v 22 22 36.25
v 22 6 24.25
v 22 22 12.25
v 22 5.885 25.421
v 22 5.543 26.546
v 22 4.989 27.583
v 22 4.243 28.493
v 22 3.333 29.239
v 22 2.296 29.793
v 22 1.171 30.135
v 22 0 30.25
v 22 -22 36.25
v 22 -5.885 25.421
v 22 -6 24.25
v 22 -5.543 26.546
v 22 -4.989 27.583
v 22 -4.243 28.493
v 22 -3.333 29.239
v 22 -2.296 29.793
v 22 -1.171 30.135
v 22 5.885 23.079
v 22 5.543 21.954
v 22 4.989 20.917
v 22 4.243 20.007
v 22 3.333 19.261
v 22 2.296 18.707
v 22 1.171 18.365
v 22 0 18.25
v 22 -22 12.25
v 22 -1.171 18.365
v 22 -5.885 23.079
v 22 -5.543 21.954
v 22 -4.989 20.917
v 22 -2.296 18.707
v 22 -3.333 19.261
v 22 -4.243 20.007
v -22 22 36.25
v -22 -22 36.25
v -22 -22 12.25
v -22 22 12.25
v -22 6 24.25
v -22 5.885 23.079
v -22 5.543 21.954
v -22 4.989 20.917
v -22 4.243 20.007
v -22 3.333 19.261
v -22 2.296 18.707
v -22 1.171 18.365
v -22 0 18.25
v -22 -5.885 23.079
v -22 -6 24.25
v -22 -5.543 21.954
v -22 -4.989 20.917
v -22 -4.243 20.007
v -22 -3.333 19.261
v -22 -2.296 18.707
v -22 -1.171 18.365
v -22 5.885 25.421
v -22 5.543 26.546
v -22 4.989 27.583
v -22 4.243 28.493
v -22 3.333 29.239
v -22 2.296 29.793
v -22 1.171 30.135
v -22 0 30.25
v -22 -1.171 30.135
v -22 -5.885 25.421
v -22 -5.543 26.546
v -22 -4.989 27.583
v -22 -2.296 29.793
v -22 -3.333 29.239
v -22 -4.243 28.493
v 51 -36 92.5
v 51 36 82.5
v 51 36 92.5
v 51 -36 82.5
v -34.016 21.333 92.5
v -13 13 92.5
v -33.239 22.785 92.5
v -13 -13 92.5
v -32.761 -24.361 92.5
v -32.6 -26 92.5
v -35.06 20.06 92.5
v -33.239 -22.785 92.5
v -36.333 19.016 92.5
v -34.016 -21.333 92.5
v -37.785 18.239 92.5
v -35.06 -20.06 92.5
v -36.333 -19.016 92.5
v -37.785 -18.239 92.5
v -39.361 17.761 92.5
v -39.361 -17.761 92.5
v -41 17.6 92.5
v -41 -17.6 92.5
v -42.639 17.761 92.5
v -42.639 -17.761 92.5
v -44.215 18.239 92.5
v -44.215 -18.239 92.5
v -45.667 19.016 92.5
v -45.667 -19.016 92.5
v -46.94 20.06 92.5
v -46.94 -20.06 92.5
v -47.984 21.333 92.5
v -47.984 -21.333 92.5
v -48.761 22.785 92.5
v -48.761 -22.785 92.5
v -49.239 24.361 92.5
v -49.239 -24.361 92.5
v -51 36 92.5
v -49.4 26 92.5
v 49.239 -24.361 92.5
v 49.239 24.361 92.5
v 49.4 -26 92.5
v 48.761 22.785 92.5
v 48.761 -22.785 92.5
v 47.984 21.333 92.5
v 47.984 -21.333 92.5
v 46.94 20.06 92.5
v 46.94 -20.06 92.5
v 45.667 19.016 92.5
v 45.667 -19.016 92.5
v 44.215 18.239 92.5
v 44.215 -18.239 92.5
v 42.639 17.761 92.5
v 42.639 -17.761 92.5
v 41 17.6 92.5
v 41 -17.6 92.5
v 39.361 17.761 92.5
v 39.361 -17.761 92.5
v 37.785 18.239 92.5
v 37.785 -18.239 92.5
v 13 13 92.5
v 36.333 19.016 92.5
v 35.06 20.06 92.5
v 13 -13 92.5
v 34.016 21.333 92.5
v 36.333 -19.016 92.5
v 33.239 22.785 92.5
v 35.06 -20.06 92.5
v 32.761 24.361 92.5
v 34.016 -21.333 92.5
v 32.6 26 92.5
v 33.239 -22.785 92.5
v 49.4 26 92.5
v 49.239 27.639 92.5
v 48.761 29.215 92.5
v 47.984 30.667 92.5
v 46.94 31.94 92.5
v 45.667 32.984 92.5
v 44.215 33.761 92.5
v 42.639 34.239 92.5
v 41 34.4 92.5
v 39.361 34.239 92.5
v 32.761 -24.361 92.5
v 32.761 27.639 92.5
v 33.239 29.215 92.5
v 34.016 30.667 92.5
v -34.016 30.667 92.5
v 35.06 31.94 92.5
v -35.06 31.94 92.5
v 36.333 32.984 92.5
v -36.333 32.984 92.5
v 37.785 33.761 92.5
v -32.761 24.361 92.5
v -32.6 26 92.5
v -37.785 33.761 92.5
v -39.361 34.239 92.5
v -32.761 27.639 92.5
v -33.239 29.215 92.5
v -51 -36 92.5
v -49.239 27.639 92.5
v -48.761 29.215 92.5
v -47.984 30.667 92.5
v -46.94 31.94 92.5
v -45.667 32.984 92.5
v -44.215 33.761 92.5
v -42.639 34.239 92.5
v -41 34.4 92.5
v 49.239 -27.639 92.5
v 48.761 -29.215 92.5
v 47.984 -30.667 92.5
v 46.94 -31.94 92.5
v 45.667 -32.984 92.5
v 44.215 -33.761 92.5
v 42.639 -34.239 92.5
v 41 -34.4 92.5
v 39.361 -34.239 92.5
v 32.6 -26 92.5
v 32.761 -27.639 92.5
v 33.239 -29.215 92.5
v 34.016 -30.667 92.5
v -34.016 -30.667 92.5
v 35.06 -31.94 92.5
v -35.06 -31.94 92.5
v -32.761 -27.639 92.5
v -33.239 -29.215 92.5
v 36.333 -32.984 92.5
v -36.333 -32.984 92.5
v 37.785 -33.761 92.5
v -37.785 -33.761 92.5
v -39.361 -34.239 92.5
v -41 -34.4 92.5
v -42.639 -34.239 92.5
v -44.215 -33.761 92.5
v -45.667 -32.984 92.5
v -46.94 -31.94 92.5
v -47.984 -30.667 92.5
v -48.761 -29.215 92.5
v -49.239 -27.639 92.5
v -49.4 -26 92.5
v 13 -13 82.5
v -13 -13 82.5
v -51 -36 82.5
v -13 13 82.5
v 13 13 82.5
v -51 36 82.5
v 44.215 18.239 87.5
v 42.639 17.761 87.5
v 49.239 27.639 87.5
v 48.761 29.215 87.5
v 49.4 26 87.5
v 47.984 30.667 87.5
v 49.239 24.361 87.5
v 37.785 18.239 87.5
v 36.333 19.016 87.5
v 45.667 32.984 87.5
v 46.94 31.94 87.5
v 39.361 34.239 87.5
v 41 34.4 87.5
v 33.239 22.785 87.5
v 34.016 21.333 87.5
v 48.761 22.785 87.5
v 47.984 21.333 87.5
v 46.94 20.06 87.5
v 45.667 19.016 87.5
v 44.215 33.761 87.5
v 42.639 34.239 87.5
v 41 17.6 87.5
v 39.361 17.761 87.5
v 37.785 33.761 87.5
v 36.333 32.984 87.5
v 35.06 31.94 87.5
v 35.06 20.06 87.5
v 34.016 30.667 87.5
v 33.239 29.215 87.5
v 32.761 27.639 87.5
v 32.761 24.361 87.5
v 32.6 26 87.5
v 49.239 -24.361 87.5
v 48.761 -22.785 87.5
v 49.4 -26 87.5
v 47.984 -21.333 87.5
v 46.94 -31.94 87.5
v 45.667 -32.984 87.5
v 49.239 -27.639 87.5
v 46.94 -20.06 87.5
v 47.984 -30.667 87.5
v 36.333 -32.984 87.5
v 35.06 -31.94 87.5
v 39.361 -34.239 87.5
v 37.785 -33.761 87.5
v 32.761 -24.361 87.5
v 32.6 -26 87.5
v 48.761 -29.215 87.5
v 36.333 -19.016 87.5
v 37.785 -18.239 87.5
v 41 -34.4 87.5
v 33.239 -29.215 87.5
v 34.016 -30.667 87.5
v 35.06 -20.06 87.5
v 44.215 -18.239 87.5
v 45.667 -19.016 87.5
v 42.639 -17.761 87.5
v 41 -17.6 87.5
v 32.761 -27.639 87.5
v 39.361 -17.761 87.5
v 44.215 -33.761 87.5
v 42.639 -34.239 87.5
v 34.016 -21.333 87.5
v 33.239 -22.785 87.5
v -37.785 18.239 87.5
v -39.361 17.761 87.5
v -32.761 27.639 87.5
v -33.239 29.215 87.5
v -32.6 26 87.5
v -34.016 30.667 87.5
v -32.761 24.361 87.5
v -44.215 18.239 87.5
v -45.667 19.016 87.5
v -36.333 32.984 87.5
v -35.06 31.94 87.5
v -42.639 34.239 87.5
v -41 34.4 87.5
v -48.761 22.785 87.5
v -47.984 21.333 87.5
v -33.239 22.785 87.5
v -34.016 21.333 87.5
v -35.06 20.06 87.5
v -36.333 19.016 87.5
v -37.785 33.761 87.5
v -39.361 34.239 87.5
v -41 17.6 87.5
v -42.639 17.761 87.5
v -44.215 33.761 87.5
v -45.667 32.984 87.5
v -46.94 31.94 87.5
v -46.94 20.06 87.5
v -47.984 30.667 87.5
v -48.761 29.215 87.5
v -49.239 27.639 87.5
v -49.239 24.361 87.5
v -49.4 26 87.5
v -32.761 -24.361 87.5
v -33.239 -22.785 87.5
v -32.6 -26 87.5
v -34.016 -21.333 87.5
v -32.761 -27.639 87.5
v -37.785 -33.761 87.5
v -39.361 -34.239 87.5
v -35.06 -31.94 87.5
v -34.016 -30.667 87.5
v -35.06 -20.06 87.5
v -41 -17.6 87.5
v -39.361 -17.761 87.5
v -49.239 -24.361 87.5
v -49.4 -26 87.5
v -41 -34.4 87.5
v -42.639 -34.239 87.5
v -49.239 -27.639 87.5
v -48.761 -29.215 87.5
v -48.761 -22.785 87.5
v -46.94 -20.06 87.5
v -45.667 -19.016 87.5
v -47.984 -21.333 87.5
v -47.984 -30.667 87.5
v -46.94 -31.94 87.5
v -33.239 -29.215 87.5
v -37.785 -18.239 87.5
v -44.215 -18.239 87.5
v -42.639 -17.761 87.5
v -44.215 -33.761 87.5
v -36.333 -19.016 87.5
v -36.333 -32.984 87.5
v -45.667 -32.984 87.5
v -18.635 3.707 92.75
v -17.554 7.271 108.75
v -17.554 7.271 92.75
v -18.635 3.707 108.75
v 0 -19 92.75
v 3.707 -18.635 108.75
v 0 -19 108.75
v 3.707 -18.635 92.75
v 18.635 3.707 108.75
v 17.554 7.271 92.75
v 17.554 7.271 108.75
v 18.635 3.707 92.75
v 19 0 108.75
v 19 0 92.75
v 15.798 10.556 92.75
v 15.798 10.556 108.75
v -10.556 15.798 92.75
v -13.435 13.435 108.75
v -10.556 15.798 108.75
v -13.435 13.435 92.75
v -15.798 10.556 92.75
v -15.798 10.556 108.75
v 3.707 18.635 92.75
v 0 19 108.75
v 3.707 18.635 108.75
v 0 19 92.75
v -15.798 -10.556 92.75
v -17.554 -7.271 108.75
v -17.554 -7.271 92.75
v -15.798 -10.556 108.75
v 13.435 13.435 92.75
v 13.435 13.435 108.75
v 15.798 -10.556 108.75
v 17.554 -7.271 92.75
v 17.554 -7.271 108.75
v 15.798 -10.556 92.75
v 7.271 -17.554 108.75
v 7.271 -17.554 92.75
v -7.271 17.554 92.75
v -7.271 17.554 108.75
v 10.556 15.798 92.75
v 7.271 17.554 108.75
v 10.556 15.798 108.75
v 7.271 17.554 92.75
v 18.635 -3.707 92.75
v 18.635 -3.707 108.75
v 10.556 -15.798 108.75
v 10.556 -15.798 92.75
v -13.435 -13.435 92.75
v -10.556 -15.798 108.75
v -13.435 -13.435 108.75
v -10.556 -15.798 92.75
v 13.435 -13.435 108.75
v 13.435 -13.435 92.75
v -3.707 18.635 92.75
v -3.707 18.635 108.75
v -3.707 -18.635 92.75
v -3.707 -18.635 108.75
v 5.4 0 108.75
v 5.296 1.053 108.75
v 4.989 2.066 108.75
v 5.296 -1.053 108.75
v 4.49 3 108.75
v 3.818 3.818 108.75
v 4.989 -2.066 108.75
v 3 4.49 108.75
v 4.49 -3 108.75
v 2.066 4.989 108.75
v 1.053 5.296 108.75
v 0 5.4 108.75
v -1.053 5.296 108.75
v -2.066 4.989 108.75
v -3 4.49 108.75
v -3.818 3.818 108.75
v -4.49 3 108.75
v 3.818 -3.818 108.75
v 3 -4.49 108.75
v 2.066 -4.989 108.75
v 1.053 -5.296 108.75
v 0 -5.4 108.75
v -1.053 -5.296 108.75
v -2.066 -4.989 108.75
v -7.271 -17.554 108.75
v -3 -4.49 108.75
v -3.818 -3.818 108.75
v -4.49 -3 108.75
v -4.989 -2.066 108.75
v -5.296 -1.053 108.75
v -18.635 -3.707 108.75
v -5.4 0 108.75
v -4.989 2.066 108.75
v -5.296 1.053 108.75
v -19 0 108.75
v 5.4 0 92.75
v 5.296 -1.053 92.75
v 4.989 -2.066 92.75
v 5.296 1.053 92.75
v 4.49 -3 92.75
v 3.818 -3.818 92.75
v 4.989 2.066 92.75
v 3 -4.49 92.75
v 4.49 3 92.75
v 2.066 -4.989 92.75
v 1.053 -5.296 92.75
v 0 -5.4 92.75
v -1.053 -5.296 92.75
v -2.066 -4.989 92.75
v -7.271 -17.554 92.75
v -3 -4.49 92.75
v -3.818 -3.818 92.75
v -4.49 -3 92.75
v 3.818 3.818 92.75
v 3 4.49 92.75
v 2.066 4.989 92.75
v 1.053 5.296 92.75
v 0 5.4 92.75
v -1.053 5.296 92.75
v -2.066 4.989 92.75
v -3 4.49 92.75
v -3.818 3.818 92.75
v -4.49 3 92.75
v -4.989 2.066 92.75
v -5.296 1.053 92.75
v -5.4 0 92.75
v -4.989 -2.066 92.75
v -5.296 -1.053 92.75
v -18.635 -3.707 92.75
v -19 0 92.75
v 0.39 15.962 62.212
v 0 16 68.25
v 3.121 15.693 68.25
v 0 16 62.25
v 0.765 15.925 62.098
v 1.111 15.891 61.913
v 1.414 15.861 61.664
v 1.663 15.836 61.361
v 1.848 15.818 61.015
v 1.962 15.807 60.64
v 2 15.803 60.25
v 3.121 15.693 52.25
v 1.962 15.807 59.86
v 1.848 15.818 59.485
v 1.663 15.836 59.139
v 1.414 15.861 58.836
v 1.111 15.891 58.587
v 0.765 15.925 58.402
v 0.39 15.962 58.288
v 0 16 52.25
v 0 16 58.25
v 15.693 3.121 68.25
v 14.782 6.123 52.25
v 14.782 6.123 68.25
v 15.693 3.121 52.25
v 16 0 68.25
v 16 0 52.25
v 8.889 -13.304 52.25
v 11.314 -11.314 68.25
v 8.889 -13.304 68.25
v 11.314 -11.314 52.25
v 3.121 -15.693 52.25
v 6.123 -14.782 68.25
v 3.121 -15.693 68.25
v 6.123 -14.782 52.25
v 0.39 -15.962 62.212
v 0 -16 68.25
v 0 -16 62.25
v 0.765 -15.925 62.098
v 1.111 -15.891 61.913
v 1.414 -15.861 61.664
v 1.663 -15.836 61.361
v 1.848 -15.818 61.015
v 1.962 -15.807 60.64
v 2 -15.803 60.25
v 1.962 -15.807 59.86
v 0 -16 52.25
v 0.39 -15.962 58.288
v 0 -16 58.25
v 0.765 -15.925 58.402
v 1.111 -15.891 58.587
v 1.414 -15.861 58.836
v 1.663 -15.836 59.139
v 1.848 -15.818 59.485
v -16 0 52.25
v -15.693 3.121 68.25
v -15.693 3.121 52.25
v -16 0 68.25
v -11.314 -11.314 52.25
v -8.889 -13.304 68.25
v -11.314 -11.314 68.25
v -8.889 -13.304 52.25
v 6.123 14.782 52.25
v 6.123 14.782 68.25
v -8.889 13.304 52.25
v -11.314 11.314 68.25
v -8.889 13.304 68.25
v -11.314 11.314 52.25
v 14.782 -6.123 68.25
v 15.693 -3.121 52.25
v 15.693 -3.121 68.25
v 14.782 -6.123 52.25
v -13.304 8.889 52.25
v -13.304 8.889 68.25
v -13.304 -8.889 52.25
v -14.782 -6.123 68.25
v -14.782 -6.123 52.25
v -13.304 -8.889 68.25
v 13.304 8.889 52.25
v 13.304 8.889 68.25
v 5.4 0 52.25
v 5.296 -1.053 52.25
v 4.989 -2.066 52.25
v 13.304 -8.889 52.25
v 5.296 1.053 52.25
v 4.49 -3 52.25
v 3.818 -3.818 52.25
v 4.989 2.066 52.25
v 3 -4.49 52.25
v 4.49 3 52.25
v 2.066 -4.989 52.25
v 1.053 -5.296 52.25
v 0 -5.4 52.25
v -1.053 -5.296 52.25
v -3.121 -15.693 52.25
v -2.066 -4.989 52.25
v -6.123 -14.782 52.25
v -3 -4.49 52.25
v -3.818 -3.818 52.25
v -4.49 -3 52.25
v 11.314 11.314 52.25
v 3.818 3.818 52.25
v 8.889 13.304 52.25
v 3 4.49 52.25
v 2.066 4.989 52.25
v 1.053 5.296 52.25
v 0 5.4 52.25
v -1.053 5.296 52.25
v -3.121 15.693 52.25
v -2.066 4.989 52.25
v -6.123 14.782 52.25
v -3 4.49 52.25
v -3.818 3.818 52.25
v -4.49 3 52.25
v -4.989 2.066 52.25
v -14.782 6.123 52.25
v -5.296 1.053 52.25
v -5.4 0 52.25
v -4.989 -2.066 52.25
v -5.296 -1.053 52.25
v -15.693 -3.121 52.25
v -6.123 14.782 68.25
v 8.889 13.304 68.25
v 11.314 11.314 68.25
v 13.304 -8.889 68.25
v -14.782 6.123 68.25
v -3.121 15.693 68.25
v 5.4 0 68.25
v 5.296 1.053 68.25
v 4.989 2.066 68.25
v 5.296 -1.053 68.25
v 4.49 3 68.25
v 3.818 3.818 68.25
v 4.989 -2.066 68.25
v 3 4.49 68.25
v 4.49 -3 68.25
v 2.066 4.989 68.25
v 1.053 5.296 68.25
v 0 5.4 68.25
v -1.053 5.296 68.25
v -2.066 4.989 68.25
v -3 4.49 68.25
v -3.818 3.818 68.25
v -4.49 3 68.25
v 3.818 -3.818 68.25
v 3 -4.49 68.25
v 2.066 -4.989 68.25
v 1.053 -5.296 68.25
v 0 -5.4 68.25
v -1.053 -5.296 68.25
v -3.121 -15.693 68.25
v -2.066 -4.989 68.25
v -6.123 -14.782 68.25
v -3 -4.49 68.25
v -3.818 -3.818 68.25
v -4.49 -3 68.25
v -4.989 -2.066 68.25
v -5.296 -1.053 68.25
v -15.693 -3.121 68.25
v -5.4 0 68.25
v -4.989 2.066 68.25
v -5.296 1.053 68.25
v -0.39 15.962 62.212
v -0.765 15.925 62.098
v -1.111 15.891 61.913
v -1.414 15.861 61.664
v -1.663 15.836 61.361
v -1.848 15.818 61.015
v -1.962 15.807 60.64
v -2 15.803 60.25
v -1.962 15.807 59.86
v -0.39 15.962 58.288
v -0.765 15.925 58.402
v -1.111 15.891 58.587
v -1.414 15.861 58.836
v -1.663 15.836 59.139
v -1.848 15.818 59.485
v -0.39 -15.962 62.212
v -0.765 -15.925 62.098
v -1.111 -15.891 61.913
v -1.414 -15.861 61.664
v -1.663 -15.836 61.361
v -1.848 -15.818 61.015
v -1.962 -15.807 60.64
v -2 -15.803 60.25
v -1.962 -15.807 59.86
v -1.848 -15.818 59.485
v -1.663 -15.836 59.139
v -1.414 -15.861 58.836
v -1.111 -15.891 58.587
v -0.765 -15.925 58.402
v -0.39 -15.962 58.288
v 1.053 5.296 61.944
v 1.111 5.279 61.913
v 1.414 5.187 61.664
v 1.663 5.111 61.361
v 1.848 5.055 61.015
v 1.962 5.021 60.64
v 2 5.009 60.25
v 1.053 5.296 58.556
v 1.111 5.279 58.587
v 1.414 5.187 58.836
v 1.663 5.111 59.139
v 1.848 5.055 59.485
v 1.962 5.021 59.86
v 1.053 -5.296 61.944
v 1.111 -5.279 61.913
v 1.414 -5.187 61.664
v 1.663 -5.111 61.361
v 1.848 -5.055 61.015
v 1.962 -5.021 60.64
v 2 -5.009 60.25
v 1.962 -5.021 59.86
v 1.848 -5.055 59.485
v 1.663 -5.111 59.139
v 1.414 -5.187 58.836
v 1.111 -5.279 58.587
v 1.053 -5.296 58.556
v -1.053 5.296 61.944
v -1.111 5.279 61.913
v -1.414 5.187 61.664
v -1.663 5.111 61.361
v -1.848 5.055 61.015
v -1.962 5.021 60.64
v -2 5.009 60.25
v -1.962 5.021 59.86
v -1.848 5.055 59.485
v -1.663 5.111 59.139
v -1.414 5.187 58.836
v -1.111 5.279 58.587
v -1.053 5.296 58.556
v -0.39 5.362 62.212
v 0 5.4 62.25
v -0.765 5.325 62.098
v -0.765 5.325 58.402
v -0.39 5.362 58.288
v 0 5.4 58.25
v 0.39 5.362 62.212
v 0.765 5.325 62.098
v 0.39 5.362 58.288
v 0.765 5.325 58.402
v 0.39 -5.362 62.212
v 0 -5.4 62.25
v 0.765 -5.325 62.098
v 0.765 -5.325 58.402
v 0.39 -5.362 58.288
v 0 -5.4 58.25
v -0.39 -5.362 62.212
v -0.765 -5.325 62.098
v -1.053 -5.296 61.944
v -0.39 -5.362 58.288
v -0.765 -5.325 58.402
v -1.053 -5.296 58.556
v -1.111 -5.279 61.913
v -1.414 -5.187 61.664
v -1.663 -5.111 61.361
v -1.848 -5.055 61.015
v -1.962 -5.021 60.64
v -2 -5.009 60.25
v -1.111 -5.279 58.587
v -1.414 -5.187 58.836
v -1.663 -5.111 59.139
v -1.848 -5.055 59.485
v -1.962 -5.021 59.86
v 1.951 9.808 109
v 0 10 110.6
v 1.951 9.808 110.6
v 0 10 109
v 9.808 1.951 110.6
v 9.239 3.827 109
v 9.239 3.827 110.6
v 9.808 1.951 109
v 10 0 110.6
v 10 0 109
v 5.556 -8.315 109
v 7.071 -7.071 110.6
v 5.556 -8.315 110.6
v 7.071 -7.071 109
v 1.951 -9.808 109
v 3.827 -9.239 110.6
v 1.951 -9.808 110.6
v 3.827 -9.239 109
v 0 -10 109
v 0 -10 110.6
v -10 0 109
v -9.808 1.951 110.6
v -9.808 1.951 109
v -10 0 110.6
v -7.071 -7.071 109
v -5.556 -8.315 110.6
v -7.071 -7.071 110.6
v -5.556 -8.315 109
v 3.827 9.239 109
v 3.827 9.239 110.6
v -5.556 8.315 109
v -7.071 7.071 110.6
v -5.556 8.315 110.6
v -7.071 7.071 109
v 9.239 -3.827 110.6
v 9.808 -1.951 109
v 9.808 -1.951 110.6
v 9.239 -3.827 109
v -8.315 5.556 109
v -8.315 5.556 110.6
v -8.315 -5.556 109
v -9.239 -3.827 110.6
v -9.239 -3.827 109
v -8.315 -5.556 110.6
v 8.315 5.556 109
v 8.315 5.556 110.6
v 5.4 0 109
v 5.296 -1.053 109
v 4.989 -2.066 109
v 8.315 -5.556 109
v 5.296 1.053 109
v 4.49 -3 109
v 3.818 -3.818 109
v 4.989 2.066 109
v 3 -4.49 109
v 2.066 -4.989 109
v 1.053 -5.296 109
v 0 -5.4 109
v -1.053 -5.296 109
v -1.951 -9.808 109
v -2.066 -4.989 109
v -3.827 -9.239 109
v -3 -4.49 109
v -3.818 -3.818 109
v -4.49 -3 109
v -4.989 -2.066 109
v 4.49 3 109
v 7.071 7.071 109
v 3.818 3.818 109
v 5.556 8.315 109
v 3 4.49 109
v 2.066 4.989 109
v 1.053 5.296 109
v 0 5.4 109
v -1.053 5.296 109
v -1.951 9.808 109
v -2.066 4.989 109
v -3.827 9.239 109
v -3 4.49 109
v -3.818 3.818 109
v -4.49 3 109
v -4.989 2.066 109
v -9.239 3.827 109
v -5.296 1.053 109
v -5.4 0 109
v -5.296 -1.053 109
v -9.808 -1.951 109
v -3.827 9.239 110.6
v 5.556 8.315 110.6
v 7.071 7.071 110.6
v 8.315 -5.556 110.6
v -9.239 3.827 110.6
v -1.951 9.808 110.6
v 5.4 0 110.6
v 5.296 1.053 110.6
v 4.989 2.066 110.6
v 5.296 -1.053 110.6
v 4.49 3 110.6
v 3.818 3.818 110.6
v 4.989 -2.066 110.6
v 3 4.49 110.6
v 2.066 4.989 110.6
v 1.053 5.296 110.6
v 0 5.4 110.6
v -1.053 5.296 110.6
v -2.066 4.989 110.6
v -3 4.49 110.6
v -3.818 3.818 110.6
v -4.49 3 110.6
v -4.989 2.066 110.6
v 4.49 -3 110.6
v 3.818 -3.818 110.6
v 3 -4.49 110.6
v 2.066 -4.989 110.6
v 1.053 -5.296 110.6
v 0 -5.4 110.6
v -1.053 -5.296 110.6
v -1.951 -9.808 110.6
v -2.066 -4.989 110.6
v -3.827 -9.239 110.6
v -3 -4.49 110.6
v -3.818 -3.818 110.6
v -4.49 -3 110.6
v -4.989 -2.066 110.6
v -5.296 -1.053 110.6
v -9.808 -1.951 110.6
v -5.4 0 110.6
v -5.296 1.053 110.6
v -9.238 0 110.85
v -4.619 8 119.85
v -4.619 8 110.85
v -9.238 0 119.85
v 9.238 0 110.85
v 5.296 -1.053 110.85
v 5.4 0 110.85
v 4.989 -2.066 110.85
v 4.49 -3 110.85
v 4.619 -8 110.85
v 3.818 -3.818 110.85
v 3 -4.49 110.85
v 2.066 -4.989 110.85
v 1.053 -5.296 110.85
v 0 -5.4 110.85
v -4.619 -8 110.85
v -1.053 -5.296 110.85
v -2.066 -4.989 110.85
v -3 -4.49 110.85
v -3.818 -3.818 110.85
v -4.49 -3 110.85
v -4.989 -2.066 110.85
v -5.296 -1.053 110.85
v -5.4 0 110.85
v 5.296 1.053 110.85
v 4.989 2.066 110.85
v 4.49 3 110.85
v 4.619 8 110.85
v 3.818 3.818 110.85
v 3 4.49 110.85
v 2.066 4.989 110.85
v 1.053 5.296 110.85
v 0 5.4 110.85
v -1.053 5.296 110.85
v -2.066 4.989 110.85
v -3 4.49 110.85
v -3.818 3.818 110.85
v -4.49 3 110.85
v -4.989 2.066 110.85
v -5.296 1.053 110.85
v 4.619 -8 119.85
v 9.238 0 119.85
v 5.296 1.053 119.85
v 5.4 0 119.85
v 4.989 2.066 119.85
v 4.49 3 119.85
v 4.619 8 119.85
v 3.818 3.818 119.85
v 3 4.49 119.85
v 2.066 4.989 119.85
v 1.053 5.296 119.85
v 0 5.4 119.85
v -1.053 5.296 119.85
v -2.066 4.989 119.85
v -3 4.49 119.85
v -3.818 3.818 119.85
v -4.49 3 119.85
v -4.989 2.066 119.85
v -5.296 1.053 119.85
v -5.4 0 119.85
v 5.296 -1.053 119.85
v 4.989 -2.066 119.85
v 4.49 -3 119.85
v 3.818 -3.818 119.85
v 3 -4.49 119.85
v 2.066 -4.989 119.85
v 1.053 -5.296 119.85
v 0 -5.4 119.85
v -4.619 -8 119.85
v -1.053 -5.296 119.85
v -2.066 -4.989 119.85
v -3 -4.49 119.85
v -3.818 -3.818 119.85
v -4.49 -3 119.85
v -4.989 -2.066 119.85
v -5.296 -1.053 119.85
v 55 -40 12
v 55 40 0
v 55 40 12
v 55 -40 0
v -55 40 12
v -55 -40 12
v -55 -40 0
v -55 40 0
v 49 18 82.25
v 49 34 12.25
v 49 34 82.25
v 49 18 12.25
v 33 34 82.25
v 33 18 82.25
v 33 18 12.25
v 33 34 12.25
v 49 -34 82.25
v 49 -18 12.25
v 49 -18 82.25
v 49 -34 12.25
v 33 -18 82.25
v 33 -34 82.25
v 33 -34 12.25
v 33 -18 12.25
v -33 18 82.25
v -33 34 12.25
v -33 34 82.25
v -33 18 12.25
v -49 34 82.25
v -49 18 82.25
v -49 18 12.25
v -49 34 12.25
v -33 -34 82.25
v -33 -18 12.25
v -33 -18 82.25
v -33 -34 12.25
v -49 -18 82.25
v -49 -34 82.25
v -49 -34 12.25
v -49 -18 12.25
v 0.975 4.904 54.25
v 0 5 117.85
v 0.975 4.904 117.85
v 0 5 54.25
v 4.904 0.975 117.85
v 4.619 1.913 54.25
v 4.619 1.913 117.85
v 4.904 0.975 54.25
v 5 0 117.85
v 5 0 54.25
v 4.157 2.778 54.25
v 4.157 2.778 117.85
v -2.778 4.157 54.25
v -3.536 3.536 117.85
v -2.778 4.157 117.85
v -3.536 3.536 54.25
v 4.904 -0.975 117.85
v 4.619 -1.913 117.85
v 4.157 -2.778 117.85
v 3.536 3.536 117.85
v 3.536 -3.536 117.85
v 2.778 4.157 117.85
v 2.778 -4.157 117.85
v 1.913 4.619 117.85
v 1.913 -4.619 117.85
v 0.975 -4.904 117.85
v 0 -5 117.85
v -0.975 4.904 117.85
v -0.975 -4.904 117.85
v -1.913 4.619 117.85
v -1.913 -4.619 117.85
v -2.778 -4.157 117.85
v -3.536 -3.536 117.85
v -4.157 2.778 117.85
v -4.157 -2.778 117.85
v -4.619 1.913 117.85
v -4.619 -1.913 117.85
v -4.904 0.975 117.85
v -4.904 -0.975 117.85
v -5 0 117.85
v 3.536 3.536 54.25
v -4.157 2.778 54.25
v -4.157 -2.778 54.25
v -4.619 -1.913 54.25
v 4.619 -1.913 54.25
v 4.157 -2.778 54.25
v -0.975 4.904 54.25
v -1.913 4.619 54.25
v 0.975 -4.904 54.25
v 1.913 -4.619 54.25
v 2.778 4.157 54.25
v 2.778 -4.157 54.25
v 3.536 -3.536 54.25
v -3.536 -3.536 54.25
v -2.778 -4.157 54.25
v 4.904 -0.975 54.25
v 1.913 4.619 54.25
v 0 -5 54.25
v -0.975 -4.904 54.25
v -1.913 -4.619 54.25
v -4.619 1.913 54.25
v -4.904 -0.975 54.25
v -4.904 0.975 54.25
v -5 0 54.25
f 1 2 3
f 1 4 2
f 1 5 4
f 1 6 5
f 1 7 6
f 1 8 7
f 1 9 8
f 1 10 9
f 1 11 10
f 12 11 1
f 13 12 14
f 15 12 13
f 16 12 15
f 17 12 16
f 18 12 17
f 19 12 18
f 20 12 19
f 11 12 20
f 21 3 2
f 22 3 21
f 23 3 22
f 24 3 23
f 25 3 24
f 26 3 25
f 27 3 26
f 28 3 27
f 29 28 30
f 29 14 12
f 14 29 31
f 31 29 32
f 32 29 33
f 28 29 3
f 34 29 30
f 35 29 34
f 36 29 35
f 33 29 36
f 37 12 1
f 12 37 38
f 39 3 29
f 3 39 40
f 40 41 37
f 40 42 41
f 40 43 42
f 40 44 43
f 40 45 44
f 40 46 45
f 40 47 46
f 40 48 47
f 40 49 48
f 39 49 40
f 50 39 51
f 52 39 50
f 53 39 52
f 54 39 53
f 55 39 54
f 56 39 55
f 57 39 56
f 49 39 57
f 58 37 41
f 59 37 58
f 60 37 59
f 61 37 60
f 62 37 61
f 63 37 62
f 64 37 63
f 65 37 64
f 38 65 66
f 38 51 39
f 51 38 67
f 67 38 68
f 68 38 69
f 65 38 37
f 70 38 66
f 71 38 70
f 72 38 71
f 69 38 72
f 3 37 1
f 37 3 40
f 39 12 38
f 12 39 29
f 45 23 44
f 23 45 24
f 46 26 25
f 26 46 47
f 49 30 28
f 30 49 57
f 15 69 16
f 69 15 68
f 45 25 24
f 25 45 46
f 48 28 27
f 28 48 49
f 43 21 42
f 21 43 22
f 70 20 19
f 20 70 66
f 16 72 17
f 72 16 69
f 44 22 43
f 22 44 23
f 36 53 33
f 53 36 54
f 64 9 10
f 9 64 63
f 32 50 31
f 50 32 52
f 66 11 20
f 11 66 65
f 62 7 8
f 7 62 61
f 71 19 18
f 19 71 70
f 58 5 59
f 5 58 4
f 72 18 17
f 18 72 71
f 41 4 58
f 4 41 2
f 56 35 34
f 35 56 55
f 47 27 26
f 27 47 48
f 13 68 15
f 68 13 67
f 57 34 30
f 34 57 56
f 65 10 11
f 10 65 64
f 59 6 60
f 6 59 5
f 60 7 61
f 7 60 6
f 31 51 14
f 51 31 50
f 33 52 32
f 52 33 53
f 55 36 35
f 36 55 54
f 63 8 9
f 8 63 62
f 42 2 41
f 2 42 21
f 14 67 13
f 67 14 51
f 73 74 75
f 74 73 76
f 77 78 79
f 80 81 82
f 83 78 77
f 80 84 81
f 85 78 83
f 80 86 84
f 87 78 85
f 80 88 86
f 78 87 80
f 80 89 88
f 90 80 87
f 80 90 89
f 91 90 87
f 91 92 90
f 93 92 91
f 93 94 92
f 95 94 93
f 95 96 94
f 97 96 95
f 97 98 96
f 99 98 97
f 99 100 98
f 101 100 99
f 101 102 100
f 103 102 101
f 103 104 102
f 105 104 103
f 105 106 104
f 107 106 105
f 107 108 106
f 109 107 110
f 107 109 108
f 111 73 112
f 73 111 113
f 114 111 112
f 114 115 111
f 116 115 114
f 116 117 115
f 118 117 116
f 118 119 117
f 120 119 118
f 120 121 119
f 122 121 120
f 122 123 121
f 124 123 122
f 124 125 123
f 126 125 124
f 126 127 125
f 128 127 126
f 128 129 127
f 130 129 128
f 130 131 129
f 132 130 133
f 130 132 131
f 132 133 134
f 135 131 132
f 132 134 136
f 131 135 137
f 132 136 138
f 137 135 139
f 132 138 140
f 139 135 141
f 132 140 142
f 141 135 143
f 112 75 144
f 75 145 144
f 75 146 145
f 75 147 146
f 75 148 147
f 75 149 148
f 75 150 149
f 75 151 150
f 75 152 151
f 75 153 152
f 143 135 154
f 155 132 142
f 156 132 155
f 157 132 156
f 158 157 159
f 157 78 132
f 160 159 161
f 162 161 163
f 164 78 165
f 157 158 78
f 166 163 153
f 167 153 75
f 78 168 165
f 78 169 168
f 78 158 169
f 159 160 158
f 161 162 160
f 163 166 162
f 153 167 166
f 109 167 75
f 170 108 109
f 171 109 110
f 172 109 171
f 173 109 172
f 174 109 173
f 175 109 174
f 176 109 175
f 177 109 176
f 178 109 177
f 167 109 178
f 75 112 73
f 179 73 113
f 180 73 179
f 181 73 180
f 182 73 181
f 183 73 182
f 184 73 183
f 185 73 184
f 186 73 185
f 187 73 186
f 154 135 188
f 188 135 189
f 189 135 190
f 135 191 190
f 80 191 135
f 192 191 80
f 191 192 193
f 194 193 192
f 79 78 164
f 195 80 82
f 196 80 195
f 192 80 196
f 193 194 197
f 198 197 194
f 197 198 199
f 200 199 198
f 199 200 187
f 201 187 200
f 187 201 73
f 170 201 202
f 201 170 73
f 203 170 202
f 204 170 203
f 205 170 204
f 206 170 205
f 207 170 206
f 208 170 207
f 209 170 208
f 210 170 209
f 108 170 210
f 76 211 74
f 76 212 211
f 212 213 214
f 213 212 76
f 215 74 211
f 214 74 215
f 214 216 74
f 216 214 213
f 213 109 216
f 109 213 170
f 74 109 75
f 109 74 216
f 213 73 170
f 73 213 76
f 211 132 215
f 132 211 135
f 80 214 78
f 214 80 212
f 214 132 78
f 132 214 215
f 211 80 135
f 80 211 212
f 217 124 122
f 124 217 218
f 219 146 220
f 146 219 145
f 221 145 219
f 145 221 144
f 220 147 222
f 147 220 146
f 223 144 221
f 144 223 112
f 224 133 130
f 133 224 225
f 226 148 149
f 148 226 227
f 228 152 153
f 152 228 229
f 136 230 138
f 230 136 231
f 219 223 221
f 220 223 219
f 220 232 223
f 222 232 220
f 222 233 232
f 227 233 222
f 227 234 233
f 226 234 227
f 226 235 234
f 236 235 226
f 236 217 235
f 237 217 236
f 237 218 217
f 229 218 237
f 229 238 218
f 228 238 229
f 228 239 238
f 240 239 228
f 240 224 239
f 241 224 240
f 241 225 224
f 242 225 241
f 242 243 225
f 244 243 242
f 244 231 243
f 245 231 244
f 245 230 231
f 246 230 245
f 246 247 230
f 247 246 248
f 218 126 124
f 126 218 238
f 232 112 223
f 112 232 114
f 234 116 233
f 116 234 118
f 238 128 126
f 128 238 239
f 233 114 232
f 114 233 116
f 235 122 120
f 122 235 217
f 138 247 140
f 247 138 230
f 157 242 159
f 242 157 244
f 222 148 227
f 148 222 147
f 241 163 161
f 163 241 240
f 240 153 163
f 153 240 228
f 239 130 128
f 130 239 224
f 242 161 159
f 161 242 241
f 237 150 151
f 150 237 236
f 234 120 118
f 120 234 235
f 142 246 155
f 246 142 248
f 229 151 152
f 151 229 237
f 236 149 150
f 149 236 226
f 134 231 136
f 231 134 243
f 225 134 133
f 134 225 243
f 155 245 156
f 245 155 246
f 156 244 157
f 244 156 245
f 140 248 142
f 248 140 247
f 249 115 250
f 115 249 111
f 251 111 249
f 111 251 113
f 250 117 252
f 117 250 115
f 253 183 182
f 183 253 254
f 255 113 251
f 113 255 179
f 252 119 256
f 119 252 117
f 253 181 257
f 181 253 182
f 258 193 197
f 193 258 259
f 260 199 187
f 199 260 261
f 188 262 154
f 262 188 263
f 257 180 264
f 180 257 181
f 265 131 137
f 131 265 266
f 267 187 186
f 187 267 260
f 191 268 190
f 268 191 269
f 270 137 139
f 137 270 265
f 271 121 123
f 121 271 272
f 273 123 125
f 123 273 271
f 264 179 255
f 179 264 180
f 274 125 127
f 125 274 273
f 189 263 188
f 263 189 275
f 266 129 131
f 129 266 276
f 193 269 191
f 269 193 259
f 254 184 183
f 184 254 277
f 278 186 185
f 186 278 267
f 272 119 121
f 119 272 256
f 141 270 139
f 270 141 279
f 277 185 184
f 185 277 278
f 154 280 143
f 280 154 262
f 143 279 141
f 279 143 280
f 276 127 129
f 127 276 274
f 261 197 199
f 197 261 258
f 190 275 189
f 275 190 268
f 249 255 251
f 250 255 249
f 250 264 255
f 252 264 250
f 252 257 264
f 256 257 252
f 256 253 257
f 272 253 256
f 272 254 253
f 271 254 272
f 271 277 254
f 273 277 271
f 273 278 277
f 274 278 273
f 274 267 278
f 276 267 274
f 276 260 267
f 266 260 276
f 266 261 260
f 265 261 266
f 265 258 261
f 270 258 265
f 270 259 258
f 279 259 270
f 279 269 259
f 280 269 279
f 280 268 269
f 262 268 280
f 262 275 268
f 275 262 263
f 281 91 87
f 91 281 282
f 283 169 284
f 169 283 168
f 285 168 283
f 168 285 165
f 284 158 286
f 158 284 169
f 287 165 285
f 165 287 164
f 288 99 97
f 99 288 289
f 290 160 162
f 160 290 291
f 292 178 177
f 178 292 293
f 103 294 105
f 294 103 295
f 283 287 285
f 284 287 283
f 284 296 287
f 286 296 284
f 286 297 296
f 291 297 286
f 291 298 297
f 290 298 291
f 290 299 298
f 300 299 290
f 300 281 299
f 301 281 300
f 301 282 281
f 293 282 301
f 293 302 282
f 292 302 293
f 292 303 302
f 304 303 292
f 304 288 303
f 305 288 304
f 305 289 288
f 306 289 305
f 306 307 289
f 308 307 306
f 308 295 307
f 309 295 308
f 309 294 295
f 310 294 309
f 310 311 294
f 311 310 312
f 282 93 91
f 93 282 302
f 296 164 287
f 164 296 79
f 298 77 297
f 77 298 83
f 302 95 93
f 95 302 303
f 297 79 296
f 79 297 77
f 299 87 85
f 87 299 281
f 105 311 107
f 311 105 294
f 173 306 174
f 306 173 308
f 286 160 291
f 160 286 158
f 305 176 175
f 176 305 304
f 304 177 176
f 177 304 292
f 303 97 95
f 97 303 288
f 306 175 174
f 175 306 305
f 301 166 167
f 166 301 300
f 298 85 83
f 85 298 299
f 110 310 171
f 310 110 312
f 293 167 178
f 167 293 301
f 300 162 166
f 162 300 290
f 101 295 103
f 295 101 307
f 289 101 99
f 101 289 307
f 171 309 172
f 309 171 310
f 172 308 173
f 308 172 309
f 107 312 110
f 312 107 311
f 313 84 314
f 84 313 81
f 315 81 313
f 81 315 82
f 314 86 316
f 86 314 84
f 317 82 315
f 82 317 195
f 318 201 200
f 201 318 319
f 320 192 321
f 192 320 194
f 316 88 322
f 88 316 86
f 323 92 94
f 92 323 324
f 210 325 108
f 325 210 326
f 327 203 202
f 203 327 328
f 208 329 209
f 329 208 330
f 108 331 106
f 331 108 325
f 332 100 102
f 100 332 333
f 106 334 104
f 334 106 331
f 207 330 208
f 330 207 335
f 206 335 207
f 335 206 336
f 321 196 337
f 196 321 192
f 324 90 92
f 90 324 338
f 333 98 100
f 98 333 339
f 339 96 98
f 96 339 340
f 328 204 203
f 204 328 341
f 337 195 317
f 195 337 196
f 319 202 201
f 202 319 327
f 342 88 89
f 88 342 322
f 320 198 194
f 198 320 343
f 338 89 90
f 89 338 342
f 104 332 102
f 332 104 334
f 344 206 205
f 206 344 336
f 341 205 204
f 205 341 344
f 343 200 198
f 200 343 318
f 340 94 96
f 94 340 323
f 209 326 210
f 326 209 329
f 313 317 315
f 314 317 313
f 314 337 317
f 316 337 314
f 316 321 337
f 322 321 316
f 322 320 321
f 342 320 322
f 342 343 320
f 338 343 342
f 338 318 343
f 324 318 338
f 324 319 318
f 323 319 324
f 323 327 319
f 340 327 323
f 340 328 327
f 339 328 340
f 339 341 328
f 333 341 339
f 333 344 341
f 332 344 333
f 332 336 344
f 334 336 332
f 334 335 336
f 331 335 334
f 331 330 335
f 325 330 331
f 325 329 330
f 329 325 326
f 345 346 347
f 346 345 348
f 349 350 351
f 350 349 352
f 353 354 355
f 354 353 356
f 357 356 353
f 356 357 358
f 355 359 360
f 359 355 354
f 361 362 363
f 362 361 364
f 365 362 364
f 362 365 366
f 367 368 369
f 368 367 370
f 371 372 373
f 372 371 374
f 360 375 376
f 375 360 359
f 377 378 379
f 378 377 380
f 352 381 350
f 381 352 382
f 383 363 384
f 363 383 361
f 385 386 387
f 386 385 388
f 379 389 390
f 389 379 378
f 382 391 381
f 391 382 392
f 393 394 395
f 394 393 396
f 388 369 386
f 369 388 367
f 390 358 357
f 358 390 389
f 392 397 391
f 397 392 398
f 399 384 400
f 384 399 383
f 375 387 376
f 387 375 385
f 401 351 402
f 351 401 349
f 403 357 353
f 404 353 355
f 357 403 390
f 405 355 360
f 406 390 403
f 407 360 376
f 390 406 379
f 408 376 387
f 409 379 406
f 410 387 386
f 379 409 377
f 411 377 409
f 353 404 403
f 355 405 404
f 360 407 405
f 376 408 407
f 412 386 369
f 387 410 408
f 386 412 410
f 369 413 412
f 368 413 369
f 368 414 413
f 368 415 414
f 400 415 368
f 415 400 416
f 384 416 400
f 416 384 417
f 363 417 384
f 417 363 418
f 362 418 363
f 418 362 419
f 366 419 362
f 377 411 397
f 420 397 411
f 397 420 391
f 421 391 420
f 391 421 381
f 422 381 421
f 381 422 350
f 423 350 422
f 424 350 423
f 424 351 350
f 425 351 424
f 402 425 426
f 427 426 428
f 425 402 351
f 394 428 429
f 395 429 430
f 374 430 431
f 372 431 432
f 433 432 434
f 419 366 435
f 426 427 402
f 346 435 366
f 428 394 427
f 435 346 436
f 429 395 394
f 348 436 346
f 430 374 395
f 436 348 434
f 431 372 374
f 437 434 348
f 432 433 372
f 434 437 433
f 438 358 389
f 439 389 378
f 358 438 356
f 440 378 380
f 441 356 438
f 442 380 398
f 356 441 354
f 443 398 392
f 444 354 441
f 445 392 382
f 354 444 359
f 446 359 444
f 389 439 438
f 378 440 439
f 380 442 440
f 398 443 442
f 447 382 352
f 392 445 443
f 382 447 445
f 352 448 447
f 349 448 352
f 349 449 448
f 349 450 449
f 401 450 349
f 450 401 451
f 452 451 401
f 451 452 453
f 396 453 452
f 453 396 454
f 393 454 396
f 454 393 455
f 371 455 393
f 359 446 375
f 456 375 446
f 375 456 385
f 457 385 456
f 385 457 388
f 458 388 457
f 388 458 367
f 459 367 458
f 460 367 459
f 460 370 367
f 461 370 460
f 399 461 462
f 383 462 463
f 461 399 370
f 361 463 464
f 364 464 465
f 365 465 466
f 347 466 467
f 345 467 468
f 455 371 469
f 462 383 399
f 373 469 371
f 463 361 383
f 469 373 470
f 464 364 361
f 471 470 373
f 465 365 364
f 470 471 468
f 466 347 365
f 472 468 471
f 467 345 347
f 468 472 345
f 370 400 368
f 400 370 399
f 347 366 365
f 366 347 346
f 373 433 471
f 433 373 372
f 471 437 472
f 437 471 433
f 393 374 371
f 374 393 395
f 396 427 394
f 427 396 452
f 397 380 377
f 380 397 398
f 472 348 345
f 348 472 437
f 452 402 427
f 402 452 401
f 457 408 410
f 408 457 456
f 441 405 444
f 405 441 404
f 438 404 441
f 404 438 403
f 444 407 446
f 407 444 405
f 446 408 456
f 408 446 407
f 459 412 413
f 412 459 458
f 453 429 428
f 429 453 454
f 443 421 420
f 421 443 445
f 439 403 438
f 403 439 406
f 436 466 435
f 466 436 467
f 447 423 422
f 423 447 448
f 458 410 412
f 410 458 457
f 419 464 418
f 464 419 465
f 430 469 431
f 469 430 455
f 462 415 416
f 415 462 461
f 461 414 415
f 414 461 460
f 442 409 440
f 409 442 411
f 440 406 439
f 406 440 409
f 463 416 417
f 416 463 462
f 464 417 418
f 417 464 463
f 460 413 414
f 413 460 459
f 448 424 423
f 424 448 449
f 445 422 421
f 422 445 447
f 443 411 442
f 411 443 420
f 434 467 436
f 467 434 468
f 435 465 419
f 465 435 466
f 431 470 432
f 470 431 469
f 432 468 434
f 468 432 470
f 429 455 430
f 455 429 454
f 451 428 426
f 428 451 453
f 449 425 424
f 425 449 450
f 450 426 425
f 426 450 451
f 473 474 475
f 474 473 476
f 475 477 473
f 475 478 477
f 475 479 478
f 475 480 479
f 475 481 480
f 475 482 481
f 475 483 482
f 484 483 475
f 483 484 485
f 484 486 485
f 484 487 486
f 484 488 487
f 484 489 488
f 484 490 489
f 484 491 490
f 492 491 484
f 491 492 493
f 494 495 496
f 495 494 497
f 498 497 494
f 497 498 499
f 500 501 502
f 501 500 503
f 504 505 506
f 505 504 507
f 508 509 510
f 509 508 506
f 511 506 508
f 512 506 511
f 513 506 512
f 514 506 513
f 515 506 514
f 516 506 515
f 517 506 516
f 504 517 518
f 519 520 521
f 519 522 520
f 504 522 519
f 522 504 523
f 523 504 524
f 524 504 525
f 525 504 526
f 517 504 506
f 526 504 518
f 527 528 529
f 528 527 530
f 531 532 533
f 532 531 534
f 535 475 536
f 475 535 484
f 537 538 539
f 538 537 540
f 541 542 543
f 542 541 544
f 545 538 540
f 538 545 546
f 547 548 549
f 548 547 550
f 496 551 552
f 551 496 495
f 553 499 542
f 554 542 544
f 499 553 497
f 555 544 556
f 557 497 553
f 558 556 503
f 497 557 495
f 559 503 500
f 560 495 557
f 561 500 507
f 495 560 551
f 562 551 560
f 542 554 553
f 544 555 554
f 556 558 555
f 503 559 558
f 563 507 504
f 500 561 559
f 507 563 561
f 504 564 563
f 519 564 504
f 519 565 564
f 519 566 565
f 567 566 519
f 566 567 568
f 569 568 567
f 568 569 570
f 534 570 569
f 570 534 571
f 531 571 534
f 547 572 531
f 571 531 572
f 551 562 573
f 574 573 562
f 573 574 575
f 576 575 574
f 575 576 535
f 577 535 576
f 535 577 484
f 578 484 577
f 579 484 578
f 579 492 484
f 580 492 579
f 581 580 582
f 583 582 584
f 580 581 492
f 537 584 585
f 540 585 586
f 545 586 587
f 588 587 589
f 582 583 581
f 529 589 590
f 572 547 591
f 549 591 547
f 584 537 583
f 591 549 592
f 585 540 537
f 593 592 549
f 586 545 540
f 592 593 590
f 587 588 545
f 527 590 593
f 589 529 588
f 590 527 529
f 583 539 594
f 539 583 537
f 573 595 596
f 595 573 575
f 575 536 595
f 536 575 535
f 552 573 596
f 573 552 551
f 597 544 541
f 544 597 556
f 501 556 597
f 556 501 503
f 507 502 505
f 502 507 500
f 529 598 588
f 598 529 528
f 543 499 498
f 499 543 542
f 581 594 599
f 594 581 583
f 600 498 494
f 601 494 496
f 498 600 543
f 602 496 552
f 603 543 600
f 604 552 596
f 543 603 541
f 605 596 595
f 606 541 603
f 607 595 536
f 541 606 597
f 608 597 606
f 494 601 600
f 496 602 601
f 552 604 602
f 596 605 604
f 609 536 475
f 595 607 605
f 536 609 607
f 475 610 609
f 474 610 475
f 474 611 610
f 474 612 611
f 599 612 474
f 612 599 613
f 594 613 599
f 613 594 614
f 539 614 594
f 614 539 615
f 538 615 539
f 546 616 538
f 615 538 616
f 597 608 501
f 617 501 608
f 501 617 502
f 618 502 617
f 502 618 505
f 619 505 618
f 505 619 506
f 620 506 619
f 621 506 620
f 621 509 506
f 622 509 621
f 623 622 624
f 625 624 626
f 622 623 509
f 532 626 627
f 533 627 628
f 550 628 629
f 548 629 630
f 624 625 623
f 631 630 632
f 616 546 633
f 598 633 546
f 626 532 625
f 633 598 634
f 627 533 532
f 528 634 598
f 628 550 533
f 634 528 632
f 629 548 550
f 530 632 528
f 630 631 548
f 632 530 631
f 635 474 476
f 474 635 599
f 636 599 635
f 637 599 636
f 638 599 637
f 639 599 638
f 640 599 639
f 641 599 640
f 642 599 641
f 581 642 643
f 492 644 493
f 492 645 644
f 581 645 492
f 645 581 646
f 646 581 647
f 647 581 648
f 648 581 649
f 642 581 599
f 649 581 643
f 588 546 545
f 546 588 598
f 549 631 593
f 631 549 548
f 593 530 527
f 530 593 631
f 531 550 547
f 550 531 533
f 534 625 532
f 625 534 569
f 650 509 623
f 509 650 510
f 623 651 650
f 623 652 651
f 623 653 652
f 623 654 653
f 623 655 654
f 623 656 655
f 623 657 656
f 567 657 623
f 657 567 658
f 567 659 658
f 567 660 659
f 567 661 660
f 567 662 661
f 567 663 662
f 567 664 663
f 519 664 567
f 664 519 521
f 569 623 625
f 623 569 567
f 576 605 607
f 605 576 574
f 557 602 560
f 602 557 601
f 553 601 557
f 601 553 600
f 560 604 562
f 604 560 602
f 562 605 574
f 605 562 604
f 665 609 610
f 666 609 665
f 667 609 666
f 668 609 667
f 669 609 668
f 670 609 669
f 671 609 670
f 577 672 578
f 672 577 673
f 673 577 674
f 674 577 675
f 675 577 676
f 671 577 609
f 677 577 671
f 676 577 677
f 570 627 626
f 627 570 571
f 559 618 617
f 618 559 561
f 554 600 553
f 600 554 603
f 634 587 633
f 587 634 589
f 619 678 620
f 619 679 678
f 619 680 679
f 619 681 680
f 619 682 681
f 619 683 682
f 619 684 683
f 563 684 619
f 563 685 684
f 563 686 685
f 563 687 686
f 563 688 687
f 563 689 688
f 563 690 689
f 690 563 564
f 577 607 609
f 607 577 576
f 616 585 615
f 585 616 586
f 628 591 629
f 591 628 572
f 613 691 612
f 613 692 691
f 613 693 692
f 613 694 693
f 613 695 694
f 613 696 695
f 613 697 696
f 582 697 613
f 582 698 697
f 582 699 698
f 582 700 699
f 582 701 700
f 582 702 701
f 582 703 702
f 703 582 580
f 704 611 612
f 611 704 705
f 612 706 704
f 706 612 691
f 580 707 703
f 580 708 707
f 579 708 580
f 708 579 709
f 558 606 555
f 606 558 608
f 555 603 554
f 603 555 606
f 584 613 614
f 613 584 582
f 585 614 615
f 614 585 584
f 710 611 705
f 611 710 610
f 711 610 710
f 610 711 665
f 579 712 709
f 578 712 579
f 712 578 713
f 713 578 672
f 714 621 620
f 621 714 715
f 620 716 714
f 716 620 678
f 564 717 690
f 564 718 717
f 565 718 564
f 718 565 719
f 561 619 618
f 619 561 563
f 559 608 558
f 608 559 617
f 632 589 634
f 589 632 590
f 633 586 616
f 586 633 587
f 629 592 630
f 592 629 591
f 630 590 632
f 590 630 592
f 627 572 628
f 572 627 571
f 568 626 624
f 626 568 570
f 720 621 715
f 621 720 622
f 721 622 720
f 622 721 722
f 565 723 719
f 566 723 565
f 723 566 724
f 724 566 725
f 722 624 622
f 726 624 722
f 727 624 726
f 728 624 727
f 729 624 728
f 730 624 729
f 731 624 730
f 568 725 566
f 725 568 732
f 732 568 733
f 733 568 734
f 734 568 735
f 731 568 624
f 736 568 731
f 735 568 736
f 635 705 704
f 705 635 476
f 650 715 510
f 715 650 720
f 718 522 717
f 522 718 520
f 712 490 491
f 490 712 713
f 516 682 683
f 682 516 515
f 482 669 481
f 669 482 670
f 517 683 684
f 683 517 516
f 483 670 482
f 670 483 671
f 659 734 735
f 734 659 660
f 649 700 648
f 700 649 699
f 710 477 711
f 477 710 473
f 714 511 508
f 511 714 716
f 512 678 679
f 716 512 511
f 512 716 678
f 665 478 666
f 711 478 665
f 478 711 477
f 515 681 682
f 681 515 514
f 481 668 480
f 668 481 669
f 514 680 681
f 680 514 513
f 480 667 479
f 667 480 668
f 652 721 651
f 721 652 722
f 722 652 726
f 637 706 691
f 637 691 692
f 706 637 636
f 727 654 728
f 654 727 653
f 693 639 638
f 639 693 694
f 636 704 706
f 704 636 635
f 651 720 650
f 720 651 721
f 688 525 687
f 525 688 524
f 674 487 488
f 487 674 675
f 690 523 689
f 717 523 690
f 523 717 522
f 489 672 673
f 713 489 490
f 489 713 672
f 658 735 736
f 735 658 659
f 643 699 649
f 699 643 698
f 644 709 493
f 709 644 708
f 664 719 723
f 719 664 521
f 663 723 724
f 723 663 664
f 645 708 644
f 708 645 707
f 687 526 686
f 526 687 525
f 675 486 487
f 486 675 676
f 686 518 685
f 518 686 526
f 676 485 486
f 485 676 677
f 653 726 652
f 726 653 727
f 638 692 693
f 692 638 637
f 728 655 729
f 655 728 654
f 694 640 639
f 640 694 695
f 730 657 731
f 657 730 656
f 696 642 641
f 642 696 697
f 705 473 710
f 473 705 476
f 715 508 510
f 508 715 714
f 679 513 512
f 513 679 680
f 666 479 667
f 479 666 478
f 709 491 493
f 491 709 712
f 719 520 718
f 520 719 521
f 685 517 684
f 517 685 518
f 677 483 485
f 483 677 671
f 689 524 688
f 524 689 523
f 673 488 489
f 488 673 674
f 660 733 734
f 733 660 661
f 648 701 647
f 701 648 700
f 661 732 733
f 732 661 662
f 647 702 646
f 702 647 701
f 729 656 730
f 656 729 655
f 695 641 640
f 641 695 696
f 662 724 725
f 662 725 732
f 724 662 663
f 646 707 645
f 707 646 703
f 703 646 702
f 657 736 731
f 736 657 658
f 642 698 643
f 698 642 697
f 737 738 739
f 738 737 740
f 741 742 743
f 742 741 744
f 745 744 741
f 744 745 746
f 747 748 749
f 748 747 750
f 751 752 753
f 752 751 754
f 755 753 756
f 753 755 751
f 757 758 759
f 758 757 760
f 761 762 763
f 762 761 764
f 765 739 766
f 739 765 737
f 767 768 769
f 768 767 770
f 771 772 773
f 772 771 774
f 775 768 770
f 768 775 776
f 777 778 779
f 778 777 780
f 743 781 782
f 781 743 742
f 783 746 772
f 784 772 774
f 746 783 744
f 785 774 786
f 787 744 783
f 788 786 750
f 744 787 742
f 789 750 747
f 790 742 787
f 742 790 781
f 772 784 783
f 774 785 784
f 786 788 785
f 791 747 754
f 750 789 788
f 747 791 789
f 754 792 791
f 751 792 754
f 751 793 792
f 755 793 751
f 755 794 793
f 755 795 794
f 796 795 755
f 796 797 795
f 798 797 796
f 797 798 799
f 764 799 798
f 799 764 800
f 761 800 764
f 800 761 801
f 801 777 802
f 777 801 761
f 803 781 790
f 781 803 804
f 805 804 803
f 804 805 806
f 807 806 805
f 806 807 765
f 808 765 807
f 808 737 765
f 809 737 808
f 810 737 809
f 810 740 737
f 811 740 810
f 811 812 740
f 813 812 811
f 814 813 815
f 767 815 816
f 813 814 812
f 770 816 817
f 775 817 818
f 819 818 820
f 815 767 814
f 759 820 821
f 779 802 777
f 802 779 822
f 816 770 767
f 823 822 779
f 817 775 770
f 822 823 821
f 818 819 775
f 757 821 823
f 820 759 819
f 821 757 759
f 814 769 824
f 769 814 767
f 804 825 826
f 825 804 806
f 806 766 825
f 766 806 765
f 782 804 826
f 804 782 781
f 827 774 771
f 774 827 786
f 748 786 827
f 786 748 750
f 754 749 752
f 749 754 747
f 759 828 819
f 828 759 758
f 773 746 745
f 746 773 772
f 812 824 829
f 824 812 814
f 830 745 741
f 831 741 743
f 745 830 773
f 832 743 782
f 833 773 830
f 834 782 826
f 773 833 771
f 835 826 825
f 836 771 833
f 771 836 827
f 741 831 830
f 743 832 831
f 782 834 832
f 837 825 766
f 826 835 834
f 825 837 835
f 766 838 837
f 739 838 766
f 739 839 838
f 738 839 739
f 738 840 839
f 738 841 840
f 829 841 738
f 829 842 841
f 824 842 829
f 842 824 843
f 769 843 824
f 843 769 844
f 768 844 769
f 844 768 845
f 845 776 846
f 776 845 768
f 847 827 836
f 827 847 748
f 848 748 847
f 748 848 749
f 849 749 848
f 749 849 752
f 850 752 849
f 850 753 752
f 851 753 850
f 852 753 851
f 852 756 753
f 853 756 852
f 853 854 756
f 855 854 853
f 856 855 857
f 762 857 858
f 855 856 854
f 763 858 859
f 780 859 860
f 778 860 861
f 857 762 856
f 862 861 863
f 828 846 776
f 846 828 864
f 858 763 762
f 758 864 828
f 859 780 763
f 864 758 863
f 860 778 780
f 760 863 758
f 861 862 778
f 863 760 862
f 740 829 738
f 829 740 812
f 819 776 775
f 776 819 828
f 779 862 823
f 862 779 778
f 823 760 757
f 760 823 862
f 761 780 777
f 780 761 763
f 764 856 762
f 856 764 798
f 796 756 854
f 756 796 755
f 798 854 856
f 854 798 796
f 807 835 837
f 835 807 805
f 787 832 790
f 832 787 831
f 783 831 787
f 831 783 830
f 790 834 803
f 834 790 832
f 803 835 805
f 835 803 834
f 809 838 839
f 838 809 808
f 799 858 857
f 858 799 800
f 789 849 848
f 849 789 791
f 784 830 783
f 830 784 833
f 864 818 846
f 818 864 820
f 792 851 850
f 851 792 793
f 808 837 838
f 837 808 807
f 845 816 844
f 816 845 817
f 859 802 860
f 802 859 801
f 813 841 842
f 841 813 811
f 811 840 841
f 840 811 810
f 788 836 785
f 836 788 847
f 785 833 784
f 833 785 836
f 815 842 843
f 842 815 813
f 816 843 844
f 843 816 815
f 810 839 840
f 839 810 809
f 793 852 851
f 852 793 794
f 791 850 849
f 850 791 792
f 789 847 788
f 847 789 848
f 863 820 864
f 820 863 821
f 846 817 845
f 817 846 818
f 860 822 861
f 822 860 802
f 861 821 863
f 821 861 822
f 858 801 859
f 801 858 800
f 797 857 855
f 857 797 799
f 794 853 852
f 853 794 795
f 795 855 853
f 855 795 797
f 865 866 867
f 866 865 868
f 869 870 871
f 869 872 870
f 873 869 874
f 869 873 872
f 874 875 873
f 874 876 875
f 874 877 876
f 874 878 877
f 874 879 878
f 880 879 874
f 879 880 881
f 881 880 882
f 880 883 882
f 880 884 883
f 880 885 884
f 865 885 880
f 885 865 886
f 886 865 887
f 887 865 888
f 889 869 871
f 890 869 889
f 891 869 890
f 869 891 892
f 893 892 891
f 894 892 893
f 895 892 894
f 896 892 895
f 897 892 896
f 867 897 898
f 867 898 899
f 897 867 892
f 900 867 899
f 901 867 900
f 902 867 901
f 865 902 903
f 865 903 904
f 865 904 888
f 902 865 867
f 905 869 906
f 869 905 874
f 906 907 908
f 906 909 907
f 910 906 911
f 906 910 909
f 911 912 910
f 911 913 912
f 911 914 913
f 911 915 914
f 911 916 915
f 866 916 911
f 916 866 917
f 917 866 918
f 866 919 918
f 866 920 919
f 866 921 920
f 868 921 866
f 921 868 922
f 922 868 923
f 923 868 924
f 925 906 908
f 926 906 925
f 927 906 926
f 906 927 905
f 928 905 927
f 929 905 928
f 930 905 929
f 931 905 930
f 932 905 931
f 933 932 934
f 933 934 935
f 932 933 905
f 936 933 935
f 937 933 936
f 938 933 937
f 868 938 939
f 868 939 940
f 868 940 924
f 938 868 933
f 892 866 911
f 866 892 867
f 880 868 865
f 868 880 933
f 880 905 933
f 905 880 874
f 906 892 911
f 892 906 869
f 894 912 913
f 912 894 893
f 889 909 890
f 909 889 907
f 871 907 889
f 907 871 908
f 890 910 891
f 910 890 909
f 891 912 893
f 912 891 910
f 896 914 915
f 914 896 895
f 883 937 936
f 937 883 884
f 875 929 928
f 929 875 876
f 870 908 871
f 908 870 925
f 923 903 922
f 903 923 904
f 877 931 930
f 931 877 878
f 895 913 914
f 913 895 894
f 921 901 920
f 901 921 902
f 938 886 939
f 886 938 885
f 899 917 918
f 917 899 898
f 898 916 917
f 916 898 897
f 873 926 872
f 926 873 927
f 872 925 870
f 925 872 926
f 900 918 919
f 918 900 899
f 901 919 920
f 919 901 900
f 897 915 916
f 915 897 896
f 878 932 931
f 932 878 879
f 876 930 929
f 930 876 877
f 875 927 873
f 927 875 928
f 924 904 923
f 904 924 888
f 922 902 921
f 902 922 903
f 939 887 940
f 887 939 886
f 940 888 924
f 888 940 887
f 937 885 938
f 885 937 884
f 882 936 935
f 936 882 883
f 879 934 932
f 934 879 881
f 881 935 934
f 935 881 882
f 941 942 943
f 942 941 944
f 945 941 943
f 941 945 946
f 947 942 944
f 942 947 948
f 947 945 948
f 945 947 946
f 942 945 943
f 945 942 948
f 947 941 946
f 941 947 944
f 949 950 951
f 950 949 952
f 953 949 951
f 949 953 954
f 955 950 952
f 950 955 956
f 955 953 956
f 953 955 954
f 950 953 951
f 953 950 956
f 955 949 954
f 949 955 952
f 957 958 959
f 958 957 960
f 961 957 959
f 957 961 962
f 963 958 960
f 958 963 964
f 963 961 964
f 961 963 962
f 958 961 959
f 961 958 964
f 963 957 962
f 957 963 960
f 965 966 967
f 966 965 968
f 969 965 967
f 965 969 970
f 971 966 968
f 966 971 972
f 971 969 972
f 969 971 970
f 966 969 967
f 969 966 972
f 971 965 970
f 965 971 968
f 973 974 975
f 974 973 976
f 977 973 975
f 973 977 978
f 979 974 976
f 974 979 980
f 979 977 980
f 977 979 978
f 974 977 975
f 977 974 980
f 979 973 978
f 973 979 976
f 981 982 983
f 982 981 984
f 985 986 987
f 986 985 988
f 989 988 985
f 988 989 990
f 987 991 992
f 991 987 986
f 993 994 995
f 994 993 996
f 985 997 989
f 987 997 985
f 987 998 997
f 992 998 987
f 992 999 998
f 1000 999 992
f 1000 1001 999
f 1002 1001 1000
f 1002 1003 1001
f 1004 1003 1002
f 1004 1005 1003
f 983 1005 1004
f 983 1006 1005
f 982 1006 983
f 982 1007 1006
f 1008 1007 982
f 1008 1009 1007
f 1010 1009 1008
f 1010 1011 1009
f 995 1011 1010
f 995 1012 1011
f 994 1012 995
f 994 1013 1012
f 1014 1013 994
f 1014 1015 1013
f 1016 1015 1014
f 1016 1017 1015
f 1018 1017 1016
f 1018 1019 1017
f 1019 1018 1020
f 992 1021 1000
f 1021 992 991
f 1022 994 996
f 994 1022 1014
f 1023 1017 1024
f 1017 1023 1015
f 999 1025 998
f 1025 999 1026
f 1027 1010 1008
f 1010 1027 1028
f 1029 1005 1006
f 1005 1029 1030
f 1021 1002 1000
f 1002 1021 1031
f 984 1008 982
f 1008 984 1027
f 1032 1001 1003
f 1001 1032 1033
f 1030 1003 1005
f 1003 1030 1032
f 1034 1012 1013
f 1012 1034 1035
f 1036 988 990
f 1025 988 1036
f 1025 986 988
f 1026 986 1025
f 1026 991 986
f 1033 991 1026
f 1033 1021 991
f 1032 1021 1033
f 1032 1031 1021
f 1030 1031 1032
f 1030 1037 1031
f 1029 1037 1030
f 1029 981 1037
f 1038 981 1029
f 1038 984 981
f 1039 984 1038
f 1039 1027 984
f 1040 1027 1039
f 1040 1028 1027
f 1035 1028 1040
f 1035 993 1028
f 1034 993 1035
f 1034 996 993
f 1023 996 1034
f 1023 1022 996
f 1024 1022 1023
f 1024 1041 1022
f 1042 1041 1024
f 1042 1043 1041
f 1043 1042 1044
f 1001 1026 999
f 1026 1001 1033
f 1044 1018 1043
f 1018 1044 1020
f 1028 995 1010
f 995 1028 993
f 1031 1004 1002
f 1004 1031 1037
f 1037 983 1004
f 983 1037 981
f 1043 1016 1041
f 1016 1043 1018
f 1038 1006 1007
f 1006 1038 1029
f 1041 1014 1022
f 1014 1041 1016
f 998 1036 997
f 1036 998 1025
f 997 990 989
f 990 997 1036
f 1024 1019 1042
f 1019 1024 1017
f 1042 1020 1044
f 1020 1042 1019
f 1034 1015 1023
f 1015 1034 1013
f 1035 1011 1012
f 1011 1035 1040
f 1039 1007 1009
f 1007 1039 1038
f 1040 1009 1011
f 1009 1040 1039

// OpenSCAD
$fn = 32;

// ------------------------------------------------------------------------
// Arbor press fixture: screw d10, posts 70 mm, gap 16 mm
// Every part is its own module, assembly() places every instance.
// ------------------------------------------------------------------------

// --- part 1 ---
module press_bed() {
  difference() {
    translate([-55, -40, 0]) cube([110, 80, 12]);
  }
}

// --- part 2 ---
module anvil_block() {
  difference() {
    translate([-22, -22, 0]) cube([44, 44, 24]);
    translate([0, 0, 12]) rotate([0, 90, 0]) cylinder(h = 46, d = 12, center = true);
  }
}

// --- part 3 ---
module press_post_a() {
  translate([-8, -8, 0]) cube([16, 16, 70]);
}

// --- part 4 ---
module press_post_b() {
  translate([-8, -8, 0]) cube([16, 16, 70]);
}

// --- part 5 ---
module press_post_c() {
  translate([-8, -8, 0]) cube([16, 16, 70]);
}

// --- part 6 ---
module press_post_d() {
  translate([-8, -8, 0]) cube([16, 16, 70]);
}

// --- part 7 ---
module press_frame() {
  difference() {
    translate([-51, -36, 0]) cube([102, 72, 10]);
    translate([-13, -13, -1]) cube([26, 26, 12]);
    translate([41, 26, 5]) cylinder(h = 6, d = 16.8);
    translate([41, -26, 5]) cylinder(h = 6, d = 16.8);
    translate([-41, 26, 5]) cylinder(h = 6, d = 16.8);
    translate([-41, -26, 5]) cylinder(h = 6, d = 16.8);
  }
}

// --- part 8 ---
module guide_ring() {
  difference() {
      translate([0, 0, 0]) cylinder(h = 16, d = 38);
      translate([0, 0, -1]) cylinder(h = 18, d = 10.8);
    }
}

// --- part 9 ---
module press_screw() {
  translate([0, 0, -31.8]) cylinder(h = 63.6, d = 10);
}

// --- part 10 ---
module press_head() {
  difference() {
    cylinder(h = 16, d = 32);
    translate([0, 0, -1]) cylinder(h = 18, d = 10.8);
    translate([0, 0, 8]) rotate([90, 0, 0]) cylinder(h = 34, d = 4, center = true);
  }
}

// --- part 11 ---
module nut_washer() {
  difference() {
      translate([0, 0, 0]) cylinder(h = 1.6, d = 20);
      translate([0, 0, -1]) cylinder(h = 3.6, d = 10.8);
    }
}

// --- part 12 ---
module press_nut() {
  difference() {
    linear_extrude(height = 9) polygon(points = [[9.238, 0], [4.619, 8], [-4.619, 8], [-9.238, 0], [-4.619, -8], [4.619, -8]]);
    translate([0, 0, -1]) cylinder(h = 11, d = 10.8);
  }
}

// --- assembly ---
module assembly() {
  color([0.80, 0.24, 0.20]) translate([0, 0, 0]) rotate([0, 0, 0]) press_bed();
  color([0.20, 0.45, 0.75]) translate([0, 0, 12.25]) rotate([0, 0, 0]) anvil_block();
  color([0.25, 0.62, 0.32]) translate([41, 26, 12.25]) rotate([0, 0, 0]) press_post_a();
  color([0.92, 0.70, 0.18]) translate([41, -26, 12.25]) rotate([0, 0, 0]) press_post_b();
  color([0.58, 0.35, 0.70]) translate([-41, 26, 12.25]) rotate([0, 0, 0]) press_post_c();
  color([0.16, 0.66, 0.66]) translate([-41, -26, 12.25]) rotate([0, 0, 0]) press_post_d();
  color([0.85, 0.48, 0.18]) translate([0, 0, 82.5]) rotate([0, 0, 0]) press_frame();
  color([0.55, 0.60, 0.65]) translate([0, 0, 92.75]) rotate([0, 0, 0]) guide_ring();
  color([0.75, 0.30, 0.55]) translate([0, 0, 86.05]) rotate([0, 0, 0]) press_screw();
  color([0.42, 0.52, 0.28]) translate([0, 0, 52.25]) rotate([0, 0, 0]) press_head();
  color([0.80, 0.24, 0.20]) translate([0, 0, 109]) rotate([0, 0, 0]) nut_washer();
  color([0.20, 0.45, 0.75]) translate([0, 0, 110.85]) rotate([0, 0, 0]) press_nut();
}

assembly();
